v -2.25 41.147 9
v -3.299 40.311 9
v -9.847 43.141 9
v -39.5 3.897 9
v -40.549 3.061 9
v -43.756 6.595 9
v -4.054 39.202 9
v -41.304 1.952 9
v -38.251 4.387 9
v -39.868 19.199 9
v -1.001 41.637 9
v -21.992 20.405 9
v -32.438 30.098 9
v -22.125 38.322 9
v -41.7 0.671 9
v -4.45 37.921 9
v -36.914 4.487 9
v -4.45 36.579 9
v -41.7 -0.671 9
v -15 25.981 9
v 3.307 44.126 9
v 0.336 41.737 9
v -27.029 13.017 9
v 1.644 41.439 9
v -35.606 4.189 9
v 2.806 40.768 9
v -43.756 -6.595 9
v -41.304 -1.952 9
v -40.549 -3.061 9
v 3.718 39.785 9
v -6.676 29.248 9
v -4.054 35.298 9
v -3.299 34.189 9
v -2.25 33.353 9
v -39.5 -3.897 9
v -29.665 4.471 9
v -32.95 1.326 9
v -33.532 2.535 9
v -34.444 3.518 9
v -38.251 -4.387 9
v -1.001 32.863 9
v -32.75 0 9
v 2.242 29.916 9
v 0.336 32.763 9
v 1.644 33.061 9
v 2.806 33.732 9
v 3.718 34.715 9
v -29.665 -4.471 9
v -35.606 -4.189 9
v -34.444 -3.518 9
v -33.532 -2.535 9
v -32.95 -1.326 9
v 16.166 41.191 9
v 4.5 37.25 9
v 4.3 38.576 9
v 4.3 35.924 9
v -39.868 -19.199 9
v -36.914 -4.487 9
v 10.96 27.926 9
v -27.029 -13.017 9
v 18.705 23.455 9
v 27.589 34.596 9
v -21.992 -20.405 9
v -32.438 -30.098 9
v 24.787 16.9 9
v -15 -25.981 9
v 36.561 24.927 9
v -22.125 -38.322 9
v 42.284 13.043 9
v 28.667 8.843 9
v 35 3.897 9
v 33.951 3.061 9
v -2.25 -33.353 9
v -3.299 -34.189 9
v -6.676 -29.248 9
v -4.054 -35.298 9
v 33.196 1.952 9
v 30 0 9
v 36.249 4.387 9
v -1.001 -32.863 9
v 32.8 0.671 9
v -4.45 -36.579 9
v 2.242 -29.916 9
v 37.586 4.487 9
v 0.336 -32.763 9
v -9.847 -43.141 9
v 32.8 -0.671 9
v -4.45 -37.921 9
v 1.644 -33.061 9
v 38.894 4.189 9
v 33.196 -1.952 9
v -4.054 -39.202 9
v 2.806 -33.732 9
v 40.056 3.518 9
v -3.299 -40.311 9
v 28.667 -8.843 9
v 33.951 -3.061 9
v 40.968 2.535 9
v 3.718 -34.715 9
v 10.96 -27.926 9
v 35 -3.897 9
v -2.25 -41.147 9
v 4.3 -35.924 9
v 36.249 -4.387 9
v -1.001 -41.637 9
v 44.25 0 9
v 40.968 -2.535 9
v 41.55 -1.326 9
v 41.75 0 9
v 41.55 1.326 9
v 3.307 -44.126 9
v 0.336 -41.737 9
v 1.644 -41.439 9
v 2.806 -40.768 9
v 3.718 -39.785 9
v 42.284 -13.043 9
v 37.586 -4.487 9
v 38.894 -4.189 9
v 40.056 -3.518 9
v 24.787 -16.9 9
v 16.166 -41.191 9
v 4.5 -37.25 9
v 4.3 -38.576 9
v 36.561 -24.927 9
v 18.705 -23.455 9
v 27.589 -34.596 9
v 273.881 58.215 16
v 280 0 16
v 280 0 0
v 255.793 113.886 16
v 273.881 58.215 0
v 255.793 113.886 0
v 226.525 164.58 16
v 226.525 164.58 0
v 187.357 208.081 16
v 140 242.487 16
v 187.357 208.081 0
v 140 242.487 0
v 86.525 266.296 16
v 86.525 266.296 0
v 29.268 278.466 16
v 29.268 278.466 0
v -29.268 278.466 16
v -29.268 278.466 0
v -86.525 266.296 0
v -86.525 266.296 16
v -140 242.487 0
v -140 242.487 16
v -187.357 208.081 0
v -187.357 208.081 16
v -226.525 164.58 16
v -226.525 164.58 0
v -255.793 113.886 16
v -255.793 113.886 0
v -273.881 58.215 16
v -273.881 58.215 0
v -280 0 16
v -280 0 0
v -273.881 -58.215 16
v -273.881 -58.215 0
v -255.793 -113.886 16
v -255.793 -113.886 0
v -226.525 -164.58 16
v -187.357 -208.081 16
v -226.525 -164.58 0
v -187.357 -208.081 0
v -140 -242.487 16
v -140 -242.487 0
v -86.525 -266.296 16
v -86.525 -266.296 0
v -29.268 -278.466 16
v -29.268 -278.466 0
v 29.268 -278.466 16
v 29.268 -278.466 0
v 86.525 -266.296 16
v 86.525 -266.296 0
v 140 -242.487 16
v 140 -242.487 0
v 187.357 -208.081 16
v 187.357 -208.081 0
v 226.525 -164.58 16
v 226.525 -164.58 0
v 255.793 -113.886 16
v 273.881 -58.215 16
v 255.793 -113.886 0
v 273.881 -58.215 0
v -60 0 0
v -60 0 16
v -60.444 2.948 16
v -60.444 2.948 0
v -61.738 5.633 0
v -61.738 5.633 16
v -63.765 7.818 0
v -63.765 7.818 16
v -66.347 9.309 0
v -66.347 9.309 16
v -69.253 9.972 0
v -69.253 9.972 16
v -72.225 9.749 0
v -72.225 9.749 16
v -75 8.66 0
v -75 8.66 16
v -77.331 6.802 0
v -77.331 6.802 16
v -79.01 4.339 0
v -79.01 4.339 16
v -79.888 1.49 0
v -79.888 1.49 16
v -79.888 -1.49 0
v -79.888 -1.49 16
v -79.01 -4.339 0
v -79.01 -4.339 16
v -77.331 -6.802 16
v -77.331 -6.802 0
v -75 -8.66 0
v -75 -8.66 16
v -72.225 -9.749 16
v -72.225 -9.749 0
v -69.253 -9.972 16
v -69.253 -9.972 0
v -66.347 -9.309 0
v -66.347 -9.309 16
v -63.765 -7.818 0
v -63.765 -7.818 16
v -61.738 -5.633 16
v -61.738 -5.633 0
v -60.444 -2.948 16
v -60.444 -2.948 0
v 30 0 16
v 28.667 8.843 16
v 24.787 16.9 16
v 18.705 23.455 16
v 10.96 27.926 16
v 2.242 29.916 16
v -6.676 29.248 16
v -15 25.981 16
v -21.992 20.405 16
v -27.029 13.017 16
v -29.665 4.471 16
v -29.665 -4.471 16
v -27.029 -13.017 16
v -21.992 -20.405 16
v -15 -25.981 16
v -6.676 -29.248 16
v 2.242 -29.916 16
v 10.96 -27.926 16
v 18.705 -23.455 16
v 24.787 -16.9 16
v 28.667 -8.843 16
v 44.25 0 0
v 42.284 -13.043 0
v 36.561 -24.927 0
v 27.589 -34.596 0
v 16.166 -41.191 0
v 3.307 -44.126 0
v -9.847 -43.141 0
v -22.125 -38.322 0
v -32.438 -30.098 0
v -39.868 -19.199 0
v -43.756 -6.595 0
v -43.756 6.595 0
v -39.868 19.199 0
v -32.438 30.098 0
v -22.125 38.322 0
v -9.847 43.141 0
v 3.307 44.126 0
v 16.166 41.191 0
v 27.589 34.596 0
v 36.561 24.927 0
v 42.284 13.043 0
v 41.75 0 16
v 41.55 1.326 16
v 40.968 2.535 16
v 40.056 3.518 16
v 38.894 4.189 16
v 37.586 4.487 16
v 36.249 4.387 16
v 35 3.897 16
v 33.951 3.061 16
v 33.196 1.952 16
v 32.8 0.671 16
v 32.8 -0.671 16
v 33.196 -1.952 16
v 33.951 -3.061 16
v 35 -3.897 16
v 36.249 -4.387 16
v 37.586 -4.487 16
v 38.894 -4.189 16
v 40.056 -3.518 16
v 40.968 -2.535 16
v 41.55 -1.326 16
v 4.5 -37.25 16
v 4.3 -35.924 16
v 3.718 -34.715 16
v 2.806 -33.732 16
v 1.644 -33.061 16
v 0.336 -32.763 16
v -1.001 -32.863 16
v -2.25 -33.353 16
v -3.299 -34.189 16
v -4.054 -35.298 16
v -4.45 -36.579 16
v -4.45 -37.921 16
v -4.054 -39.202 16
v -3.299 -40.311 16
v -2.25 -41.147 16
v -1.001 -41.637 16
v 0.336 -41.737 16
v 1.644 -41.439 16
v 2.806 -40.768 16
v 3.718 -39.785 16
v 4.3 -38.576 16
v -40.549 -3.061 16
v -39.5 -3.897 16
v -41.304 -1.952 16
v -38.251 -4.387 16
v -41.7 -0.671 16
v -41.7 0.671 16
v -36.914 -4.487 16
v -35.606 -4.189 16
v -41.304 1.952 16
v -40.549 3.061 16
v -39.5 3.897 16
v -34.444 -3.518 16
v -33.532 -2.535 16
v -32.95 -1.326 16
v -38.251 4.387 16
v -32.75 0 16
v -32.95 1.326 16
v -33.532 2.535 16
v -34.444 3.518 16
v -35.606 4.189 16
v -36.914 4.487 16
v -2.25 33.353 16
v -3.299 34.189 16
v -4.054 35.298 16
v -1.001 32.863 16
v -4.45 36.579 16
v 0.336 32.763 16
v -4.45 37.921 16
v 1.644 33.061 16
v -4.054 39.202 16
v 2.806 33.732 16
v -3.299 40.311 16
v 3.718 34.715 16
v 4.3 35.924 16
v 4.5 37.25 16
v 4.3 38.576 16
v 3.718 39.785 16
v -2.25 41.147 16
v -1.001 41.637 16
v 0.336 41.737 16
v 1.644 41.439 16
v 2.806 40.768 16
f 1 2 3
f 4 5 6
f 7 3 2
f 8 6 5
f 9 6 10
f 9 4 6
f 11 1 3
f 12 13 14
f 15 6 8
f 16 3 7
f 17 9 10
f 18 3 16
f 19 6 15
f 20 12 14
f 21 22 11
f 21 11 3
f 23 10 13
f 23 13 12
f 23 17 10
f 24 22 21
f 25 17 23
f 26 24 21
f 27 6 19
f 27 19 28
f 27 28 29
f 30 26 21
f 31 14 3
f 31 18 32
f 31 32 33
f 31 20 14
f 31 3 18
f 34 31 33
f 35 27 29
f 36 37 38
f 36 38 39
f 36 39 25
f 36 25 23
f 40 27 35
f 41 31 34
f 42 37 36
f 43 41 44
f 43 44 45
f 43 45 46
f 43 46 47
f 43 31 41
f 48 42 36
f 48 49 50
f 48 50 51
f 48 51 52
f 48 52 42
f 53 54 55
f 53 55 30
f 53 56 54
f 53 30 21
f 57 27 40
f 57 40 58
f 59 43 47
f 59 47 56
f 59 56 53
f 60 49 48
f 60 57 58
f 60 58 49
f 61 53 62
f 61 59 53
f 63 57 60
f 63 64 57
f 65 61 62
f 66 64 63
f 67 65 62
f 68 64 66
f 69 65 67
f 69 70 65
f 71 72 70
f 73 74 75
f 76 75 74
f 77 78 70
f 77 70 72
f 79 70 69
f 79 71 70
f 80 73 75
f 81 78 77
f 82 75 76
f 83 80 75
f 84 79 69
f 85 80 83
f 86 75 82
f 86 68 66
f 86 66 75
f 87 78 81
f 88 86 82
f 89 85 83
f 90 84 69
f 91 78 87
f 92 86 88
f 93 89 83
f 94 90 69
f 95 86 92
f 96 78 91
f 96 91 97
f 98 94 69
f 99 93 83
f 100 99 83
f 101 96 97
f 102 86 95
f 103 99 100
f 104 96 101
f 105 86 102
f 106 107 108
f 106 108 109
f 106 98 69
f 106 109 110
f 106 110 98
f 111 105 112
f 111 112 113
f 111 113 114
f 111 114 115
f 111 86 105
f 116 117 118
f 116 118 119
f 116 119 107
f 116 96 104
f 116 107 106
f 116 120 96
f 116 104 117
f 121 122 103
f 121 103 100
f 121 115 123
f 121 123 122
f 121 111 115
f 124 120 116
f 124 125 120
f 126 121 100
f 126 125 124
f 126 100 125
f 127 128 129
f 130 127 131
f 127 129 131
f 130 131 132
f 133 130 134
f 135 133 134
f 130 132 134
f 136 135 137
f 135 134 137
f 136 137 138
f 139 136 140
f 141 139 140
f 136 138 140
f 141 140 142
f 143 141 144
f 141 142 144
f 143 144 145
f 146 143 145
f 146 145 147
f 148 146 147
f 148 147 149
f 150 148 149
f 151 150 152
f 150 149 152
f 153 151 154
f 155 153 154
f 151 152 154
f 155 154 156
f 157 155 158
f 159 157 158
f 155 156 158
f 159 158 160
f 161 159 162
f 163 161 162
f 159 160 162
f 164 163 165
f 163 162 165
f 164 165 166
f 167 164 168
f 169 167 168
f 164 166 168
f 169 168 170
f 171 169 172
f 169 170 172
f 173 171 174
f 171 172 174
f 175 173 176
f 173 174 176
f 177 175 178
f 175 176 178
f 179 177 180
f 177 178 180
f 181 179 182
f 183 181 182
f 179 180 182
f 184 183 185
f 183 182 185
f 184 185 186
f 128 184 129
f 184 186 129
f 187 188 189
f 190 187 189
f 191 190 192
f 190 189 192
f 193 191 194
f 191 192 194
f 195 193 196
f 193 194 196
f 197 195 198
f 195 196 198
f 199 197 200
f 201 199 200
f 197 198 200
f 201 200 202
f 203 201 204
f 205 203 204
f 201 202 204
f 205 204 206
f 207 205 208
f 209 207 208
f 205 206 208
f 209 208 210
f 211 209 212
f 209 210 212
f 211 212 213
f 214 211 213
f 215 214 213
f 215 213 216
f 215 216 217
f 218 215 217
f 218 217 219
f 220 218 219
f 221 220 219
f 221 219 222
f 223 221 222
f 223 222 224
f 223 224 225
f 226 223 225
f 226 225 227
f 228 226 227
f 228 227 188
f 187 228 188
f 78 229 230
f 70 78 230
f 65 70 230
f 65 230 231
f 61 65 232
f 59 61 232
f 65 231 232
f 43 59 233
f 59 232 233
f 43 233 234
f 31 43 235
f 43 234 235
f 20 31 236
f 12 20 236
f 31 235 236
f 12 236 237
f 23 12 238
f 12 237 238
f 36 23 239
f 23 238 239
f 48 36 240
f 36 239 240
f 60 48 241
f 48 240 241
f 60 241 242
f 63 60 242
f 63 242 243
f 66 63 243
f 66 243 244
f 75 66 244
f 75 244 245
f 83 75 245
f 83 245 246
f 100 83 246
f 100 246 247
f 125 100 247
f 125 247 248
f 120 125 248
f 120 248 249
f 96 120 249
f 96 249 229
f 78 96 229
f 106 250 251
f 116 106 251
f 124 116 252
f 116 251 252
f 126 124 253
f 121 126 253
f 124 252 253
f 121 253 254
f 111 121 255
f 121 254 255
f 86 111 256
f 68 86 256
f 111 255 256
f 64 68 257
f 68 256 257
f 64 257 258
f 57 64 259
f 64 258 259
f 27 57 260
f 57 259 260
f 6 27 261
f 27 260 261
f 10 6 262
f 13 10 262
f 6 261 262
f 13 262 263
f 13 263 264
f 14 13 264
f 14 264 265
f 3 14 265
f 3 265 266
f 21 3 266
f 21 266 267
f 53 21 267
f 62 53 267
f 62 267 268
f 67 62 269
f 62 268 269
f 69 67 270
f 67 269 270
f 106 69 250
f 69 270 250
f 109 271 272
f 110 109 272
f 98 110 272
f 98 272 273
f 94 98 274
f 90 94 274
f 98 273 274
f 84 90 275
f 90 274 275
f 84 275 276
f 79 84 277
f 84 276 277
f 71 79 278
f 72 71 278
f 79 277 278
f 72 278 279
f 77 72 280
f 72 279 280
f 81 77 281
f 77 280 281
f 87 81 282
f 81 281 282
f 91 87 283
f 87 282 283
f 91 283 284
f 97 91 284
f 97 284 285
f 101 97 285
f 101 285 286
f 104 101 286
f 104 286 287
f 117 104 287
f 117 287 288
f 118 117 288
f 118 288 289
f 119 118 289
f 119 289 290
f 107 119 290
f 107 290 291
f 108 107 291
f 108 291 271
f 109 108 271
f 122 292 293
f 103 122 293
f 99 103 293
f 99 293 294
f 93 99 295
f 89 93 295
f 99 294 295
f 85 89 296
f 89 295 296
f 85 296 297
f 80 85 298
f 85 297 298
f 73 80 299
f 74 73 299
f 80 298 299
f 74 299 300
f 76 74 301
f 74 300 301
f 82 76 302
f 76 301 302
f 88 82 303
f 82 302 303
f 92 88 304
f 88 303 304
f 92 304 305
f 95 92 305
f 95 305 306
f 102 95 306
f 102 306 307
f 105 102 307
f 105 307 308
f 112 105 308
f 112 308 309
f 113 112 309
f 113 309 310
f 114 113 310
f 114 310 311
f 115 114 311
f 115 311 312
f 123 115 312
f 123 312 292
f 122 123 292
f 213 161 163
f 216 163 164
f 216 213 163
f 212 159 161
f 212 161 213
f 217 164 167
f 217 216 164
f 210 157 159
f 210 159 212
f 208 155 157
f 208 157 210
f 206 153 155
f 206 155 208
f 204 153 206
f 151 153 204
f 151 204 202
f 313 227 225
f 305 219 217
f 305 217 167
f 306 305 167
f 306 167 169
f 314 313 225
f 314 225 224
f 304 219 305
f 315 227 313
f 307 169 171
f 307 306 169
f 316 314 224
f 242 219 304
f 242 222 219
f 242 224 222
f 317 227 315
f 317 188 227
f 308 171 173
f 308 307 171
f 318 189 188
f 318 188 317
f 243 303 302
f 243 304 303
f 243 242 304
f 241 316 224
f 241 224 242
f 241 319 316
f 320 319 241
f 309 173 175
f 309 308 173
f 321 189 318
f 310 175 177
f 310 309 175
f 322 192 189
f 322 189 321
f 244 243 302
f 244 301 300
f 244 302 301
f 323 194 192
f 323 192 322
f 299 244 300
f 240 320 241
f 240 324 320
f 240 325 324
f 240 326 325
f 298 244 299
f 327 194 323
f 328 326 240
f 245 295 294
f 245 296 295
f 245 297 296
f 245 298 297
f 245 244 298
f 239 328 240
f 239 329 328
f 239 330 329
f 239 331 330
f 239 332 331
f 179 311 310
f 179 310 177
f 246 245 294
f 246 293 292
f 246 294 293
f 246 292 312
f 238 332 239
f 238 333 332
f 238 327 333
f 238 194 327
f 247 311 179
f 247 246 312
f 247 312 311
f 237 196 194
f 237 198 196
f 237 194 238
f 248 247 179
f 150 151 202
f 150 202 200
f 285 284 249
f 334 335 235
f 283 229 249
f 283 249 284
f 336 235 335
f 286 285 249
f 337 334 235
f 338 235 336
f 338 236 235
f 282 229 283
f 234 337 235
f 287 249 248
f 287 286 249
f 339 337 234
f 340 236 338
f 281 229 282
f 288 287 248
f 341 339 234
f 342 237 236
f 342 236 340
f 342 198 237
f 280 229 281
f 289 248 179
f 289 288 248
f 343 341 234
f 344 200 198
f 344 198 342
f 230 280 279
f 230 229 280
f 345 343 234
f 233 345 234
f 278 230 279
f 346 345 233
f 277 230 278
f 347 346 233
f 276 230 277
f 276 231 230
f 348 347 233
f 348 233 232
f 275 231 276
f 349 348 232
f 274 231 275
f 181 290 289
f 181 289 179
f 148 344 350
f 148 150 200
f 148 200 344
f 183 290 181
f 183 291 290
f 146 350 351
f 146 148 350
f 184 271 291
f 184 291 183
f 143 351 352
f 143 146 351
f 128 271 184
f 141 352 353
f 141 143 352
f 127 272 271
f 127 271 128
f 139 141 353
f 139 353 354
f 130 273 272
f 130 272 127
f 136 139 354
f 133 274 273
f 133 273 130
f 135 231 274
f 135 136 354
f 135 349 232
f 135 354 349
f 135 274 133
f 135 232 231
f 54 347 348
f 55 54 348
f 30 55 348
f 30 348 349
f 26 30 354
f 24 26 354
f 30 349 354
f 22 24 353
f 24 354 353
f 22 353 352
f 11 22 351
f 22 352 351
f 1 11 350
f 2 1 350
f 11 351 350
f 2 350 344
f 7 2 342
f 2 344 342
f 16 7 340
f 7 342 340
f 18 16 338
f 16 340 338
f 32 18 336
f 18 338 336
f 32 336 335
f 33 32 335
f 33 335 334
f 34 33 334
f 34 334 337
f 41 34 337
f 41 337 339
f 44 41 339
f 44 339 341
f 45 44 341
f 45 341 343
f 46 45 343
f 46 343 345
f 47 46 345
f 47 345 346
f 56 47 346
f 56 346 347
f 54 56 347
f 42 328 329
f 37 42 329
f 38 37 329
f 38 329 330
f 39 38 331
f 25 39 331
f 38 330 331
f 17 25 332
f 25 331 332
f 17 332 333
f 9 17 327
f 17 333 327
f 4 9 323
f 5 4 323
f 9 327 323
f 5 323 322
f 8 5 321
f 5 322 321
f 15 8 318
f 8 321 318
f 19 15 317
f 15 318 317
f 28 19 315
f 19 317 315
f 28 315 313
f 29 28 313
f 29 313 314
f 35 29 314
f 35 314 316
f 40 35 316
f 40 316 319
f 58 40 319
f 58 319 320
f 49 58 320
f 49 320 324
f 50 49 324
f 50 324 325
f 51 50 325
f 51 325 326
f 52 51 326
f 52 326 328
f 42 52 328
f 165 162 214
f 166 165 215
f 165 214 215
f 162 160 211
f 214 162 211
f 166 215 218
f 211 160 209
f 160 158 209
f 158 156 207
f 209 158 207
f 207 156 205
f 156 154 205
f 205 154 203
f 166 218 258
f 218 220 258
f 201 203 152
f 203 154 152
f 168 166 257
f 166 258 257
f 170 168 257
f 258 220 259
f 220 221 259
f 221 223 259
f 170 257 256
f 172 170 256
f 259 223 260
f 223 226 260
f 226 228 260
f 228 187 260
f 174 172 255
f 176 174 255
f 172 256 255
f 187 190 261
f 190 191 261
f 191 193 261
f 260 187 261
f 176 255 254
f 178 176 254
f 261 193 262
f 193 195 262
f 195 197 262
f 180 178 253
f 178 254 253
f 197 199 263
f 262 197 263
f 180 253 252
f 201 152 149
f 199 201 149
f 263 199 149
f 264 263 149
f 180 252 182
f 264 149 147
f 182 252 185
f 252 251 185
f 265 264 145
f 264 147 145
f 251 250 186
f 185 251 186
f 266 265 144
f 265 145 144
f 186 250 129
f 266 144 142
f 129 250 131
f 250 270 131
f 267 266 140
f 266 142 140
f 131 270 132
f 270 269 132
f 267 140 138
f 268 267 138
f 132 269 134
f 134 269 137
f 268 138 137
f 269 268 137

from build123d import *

# Parameters (mm, degrees)
F0_R     = 280
F1_DEPTH = 16
F2_R     = 30
F2_R_2   = 10
F2_R_3   = 4.5
F3_DEPTH = 25
F4_R     = 44.25
F5_DEPTH = 9


with BuildPart() as f1:
    # F0 (on Top) → F1 (new body)
    with BuildSketch(Plane.XY):
        Circle(F0_R)
    extrude(amount=F1_DEPTH)

    # F2 (on face) → F3 (cut)
    with BuildSketch(Plane.XY.offset(16)):
        Circle(F2_R)
        with Locations((-70, 0)):
            Circle(F2_R_2)
        with Locations((-37.25, 0)):
            Circle(F2_R_3)
        with Locations((0, 37.25)):
            Circle(F2_R_3)
        with Locations((37.25, 0)):
            Circle(F2_R_3)
        with Locations((0, -37.25)):
            Circle(F2_R_3)
    extrude(amount=-F3_DEPTH, mode=Mode.SUBTRACT)

    # F4 (on face) → F5 (cut)
    with BuildSketch(Plane(origin=(0, 0, 0), x_dir=(1, 0, 0), z_dir=(0, 0, -1))):
        Circle(F4_R)
    extrude(amount=-F5_DEPTH, mode=Mode.SUBTRACT)


solid = f1.part
